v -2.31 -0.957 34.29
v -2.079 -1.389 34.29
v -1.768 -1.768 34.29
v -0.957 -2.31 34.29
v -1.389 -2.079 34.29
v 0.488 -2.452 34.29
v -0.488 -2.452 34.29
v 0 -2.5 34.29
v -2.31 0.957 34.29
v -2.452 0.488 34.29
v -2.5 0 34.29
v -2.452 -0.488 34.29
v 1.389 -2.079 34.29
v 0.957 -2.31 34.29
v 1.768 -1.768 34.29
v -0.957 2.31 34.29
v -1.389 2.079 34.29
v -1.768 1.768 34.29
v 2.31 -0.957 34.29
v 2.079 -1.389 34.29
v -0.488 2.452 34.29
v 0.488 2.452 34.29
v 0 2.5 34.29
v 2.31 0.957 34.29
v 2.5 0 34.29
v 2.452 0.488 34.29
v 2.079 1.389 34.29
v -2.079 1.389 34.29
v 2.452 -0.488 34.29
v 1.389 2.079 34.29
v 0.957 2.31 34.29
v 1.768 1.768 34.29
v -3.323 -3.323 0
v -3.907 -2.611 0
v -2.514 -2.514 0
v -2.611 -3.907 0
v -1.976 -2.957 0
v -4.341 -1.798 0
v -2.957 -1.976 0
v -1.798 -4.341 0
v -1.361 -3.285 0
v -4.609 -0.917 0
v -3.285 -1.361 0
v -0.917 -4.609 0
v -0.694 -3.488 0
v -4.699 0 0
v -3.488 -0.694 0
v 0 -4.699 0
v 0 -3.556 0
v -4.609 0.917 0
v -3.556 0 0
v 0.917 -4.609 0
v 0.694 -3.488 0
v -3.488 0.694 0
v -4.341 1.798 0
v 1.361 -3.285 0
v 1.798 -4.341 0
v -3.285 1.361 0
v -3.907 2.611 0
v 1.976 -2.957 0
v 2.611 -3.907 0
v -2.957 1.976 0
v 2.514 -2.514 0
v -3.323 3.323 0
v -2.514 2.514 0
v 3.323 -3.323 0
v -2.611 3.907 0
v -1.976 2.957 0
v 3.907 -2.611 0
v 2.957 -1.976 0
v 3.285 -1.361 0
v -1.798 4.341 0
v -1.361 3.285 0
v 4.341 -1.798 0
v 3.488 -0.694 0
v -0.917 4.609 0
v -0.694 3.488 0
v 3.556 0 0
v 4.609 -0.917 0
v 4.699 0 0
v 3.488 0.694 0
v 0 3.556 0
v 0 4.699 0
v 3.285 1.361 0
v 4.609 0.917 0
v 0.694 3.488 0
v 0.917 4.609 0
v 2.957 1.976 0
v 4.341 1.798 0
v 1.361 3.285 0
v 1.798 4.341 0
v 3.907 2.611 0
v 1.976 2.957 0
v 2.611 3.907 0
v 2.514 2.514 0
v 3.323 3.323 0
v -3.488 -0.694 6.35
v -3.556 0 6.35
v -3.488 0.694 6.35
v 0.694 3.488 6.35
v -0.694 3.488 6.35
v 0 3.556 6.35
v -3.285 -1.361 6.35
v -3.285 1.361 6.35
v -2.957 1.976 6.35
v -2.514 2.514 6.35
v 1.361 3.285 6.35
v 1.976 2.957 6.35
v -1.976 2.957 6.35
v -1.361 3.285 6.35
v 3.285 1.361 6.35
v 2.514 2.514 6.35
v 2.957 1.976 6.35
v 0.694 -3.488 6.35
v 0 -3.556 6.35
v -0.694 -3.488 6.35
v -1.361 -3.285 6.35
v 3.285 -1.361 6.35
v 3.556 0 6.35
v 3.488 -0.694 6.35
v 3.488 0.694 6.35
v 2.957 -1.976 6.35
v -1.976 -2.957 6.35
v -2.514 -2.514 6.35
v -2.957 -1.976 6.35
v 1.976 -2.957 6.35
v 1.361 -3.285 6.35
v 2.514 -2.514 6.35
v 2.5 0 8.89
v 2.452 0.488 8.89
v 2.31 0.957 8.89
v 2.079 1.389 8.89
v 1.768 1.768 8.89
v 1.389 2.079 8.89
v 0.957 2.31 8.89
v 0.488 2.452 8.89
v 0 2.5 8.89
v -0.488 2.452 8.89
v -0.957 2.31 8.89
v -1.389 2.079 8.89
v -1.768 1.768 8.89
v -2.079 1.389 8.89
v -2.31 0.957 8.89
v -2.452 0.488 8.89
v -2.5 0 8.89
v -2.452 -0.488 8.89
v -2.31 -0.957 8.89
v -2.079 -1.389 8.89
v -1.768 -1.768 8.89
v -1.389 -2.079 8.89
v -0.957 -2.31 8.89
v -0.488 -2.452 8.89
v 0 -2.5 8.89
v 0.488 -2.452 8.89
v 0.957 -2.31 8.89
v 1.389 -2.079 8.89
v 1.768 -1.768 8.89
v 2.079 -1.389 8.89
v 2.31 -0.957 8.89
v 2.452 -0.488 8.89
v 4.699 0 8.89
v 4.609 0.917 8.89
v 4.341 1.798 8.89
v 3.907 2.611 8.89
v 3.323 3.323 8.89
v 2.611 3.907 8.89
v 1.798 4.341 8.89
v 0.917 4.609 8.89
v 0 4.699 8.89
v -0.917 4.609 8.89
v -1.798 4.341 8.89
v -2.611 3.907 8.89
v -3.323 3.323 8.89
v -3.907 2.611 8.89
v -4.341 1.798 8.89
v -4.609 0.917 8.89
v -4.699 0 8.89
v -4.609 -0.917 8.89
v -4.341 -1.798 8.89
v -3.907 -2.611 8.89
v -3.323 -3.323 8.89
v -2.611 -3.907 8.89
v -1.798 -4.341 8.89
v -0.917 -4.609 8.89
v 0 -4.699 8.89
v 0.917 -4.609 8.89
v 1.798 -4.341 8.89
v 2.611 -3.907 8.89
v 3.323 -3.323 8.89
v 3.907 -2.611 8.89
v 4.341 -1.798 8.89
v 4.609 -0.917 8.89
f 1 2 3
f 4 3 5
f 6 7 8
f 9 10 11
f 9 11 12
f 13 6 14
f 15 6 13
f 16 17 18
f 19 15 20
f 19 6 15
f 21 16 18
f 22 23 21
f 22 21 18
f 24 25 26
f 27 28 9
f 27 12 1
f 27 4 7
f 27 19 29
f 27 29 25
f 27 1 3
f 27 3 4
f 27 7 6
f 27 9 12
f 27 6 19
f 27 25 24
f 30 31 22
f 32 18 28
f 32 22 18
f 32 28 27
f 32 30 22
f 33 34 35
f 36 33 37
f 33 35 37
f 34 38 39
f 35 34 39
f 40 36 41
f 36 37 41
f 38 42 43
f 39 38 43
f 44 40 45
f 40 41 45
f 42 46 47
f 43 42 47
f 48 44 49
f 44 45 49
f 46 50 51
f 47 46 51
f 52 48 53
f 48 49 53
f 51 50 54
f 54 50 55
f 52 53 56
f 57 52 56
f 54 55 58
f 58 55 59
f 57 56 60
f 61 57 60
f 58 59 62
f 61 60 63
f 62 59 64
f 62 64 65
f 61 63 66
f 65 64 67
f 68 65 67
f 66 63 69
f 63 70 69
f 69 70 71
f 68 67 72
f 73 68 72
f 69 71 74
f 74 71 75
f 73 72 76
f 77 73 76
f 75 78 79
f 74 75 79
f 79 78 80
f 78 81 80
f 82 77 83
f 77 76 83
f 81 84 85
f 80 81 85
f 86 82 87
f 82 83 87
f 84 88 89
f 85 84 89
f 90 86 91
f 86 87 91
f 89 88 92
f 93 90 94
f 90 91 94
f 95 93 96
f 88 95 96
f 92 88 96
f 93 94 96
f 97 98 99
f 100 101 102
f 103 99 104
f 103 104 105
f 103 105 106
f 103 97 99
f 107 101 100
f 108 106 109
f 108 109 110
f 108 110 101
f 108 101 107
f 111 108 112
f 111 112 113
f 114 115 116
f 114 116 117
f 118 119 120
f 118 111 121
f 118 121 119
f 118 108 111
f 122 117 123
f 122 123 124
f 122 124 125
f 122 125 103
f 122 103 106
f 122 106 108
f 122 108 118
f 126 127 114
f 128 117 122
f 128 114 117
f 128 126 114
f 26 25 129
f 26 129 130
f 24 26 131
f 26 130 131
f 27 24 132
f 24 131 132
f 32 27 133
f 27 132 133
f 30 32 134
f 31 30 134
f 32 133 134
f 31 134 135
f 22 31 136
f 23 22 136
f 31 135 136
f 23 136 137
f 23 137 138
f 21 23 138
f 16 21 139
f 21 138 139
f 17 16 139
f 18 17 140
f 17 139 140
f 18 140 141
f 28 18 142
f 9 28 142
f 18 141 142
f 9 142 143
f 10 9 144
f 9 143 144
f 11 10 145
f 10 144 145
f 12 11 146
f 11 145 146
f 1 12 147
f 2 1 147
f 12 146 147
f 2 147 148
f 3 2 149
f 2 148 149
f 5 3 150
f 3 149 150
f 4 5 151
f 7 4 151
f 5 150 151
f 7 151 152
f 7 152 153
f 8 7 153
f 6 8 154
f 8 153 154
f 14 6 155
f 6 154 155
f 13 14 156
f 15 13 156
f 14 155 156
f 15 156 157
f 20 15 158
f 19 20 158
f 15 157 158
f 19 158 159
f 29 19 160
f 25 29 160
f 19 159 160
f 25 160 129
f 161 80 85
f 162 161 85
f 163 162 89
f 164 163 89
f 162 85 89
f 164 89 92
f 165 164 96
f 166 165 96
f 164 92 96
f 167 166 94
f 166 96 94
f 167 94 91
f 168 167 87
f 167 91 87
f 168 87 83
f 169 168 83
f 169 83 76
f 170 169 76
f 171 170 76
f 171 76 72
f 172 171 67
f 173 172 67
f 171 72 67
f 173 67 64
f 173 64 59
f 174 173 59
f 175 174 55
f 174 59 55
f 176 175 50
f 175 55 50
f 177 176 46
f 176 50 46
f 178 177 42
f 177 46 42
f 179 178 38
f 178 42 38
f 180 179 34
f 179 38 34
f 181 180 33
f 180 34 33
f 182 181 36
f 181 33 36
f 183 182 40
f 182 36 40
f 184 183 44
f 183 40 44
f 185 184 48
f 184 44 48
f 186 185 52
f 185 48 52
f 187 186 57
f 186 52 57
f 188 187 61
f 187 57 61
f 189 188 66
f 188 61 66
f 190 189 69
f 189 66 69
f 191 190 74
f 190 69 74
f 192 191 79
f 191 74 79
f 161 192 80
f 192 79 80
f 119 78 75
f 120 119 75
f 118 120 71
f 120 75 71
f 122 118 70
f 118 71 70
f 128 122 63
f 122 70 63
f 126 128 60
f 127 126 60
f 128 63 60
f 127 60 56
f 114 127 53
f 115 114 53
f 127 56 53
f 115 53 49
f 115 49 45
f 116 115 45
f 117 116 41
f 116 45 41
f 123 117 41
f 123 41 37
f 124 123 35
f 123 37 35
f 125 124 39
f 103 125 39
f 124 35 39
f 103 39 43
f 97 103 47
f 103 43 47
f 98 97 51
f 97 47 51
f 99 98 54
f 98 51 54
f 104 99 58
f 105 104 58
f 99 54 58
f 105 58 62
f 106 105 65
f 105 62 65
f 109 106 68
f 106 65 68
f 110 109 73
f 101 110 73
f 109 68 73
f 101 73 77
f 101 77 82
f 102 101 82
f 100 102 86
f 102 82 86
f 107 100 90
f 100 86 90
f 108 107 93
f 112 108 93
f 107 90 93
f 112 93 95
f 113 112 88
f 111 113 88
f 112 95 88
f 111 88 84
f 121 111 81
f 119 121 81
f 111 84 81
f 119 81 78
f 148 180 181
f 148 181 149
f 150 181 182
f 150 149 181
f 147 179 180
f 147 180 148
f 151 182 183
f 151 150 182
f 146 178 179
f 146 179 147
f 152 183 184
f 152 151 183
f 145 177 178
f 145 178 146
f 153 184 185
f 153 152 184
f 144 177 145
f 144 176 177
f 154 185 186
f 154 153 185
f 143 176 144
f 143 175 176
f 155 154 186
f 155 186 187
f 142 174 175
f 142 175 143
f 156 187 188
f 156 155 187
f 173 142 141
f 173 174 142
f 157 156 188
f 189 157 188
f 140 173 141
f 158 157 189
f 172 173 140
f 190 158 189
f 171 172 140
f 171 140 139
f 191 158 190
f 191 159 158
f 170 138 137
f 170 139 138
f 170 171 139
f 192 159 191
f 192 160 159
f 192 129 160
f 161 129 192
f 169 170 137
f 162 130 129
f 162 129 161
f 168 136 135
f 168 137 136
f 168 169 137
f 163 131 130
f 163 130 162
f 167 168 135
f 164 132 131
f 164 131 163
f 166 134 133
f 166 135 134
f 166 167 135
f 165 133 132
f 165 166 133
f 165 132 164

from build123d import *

# Parameters (mm, degrees)
F0_R     = 4.699
F1_DEPTH = 8.89
F2_R     = 2.5
F3_DEPTH = 25.4
F4_R     = 3.556
F5_DEPTH = 6.35


# Not quite as in the source:
# - a feature names something its author has since deleted; it is built from what else it names


with BuildPart() as f1:
    # F0 (on Top) → F1 (new body)
    with BuildSketch(Plane.XY):
        Circle(F0_R)
    extrude(amount=F1_DEPTH)

    # F2 (on face) → F3 (join)
    with BuildSketch(Plane.XY.offset(8.89)):
        Circle(F2_R)
    extrude(amount=F3_DEPTH)

    # F4 (on face) → F5 (cut)
    with BuildSketch(Plane(origin=(0, 0, 0), x_dir=(1, 0, 0), z_dir=(0, 0, -1))):
        Circle(F4_R)
    extrude(amount=-F5_DEPTH, mode=Mode.SUBTRACT)


solid = f1.part
